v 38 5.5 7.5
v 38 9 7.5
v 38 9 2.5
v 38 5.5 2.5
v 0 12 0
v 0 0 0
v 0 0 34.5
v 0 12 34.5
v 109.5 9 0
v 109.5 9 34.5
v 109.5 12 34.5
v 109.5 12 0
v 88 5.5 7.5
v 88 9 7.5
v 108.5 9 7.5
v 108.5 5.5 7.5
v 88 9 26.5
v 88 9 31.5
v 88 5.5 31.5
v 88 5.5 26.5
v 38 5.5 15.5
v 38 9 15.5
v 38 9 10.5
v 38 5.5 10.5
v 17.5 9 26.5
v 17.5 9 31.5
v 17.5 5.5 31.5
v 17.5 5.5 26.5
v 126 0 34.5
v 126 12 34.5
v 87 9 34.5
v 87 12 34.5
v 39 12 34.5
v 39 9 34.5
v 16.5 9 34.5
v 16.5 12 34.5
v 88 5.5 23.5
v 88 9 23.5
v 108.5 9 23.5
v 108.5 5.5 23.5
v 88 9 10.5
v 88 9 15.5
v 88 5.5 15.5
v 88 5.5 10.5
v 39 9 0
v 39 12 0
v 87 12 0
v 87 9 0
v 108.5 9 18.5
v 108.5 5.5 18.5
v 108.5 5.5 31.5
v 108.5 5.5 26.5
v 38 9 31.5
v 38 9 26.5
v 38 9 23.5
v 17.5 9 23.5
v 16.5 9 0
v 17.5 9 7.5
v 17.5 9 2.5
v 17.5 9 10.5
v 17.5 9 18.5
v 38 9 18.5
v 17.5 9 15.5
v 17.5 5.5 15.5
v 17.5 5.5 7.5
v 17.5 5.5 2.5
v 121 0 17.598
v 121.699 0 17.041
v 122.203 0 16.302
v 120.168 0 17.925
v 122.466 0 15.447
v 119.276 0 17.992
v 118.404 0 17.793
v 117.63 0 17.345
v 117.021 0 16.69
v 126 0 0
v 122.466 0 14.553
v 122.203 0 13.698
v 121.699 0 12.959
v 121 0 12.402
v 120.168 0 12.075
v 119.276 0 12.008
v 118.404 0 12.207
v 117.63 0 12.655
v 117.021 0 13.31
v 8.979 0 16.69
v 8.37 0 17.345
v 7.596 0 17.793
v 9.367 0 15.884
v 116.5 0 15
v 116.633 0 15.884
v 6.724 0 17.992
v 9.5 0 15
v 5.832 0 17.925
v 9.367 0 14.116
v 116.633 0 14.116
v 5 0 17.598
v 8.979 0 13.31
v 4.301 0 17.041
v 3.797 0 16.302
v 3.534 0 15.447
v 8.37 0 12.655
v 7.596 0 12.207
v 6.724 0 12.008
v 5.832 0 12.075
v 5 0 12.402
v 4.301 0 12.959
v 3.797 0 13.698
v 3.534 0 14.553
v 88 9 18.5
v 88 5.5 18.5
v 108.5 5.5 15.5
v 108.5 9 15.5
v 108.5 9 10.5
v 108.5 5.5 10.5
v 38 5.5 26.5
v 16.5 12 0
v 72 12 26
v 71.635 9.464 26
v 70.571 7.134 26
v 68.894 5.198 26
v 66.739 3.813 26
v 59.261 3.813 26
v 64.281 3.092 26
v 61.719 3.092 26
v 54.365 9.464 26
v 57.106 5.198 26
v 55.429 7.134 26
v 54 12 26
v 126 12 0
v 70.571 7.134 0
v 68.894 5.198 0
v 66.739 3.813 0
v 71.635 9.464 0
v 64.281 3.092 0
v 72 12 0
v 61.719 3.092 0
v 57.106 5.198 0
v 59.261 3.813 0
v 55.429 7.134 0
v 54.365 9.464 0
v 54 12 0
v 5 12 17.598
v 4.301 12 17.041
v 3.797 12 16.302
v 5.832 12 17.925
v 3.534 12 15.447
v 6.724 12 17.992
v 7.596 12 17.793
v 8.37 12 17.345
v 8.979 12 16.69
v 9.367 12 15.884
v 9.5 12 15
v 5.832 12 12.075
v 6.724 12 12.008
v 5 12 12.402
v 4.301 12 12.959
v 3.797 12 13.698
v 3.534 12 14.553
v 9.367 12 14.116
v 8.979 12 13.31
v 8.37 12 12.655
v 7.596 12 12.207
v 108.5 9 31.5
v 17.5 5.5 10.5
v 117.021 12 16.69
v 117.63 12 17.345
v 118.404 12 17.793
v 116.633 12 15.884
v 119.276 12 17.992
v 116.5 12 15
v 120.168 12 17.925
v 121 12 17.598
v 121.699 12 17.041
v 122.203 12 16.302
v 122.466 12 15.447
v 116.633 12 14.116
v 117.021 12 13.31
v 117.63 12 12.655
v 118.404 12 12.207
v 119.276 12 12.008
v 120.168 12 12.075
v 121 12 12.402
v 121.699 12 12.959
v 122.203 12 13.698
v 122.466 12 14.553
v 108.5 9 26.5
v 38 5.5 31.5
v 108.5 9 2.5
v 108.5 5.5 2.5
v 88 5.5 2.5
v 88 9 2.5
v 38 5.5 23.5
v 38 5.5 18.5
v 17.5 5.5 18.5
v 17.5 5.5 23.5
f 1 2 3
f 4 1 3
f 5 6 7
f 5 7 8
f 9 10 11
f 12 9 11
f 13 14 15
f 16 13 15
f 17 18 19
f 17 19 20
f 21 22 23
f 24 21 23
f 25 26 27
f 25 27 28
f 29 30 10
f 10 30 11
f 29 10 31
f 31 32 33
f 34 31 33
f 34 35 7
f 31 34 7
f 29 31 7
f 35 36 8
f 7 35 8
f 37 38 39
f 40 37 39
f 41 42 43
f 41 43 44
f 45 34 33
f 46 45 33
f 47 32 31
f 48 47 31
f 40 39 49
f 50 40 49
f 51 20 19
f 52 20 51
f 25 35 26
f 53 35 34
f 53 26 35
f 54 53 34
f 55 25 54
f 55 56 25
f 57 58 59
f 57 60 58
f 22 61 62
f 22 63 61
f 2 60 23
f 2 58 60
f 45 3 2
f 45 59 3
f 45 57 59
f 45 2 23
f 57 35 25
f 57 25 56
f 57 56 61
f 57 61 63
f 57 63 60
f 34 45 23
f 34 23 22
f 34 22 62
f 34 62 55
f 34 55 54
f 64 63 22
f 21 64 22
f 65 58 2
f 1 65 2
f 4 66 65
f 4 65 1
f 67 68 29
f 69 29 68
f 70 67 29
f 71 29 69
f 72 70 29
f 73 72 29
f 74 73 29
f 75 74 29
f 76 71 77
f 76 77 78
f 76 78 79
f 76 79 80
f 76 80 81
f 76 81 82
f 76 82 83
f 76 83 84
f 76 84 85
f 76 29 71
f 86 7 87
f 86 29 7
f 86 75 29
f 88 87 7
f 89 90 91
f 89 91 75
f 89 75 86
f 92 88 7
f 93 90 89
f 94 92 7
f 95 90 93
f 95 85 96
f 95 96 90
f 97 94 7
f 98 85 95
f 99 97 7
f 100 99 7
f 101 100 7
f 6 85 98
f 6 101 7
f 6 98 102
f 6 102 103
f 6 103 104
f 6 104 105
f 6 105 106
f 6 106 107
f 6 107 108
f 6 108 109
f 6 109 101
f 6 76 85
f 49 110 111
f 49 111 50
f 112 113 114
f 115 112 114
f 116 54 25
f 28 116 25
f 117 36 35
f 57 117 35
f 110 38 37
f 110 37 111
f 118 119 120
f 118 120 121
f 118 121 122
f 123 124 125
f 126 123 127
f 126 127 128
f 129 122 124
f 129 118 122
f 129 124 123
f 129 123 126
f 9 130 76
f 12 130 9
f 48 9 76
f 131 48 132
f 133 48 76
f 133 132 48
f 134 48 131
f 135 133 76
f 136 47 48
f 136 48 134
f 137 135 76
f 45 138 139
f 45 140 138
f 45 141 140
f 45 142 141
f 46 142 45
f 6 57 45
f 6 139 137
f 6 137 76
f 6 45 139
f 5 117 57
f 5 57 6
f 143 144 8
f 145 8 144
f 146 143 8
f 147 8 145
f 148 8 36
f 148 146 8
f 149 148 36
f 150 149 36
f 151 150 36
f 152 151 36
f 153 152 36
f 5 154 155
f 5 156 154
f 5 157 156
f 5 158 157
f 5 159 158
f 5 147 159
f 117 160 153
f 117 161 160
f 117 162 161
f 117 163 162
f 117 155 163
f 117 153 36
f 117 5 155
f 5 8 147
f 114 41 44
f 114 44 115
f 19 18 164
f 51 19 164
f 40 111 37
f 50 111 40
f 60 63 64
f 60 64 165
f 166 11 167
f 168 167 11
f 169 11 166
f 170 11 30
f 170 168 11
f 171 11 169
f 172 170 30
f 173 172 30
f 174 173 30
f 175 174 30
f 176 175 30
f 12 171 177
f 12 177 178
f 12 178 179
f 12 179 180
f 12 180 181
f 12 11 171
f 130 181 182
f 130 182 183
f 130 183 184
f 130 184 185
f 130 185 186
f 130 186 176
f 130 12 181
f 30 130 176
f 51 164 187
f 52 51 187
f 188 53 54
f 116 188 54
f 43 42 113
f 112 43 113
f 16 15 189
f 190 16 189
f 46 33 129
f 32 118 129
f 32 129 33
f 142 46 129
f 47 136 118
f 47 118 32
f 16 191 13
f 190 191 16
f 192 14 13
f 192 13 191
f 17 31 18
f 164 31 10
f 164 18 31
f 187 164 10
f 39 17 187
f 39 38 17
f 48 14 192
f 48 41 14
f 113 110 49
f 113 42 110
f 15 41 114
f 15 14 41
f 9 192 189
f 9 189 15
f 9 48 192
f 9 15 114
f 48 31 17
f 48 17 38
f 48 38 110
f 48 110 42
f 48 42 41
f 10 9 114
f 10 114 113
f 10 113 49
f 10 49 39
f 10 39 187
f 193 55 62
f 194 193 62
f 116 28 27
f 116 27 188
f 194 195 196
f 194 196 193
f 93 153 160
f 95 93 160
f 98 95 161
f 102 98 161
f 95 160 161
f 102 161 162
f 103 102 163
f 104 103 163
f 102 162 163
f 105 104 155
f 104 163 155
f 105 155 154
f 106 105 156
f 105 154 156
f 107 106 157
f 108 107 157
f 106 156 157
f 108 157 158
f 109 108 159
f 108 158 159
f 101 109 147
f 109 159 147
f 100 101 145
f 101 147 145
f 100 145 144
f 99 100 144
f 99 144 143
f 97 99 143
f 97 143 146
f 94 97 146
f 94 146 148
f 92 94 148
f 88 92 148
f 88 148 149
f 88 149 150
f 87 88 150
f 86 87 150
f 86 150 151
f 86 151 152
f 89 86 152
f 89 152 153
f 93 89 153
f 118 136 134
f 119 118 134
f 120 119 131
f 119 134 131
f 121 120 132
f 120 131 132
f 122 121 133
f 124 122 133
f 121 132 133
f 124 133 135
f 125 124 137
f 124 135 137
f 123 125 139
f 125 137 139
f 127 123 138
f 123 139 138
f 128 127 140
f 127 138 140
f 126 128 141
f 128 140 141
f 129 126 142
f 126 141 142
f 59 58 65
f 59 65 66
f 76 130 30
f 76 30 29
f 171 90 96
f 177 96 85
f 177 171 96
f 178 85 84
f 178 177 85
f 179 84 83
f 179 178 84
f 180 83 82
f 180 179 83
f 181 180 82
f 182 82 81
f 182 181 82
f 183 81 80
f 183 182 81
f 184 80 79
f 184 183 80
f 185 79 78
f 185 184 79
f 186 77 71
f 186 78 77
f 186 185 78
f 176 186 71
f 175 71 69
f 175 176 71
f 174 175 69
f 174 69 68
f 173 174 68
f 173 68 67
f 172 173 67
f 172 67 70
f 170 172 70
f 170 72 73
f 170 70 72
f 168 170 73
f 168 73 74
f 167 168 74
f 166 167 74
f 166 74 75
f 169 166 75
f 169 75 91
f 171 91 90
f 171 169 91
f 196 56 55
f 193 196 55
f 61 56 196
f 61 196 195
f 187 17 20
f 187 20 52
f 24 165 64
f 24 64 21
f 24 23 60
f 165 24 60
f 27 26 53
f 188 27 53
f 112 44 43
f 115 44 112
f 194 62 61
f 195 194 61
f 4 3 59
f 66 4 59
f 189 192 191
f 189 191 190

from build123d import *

# Parameters (mm, degrees)
SALIENTE_EXTRUIR1_DEPTH = 34.5
CROQUIS2_R              = 9
CORTAR_EXTRUIR1_DEPTH   = 26
CROQUIS3_W              = 10
CROQUIS3_H              = 5
CROQUIS3_W_2            = 10.5
CROQUIS3_W_3            = 20.5
CORTAR_EXTRUIR2_DEPTH   = 3.5
CROQUIS4_R              = 3
CORTAR_EXTRUIR3_DEPTH   = 13


with BuildPart() as part:
    # Croquis1 → Saliente-Extruir1 (new body)
    with BuildSketch(Plane.XY):
        Polygon((0, 0), (0, 12), (16.5, 12), (16.5, 9), (39, 9), (39, 12), (87, 12), (87, 9), (109.5, 9), (109.5, 12), (126, 12), (126, 0), align=None)
    extrude(amount=SALIENTE_EXTRUIR1_DEPTH)

    # Croquis2 → Cortar-Extruir1 (cut)
    with BuildSketch(Plane(origin=(0, 0, 0), x_dir=(-1, 0, 0), z_dir=(0, 0, -1))):
        with Locations((-63, 12)):
            Circle(CROQUIS2_R)
    extrude(amount=-CORTAR_EXTRUIR1_DEPTH, mode=Mode.SUBTRACT)

    # Croquis3 → Cortar-Extruir2 (cut)
    with BuildSketch(Plane(origin=(0, 9, 0), x_dir=(1, 0, 0), z_dir=(0, 1, 0))):
        with Locations((22.5, -29)):
            Rectangle(CROQUIS3_W, CROQUIS3_H)
        with Locations((32.75, -29)):
            Rectangle(CROQUIS3_W_2, CROQUIS3_H)
        with Locations((32.75, -21)):
            Rectangle(CROQUIS3_W_2, CROQUIS3_H)
        with Locations((22.5, -21)):
            Rectangle(CROQUIS3_W, CROQUIS3_H)
        with Locations((32.75, -13)):
            Rectangle(CROQUIS3_W_2, CROQUIS3_H)
        with Locations((22.5, -13)):
            Rectangle(CROQUIS3_W, CROQUIS3_H)
        with Locations((32.75, -5)):
            Rectangle(CROQUIS3_W_2, CROQUIS3_H)
        with Locations((22.5, -5)):
            Rectangle(CROQUIS3_W, CROQUIS3_H)
        with Locations((98.25, -29)):
            Rectangle(CROQUIS3_W_3, CROQUIS3_H)
        with Locations((98.25, -21)):
            Rectangle(CROQUIS3_W_3, CROQUIS3_H)
        with Locations((98.25, -13)):
            Rectangle(CROQUIS3_W_3, CROQUIS3_H)
        with Locations((98.25, -5)):
            Rectangle(CROQUIS3_W_3, CROQUIS3_H)
    extrude(amount=-CORTAR_EXTRUIR2_DEPTH, mode=Mode.SUBTRACT)

    # Croquis4 → Cortar-Extruir3 (cut, through all)
    with BuildSketch(Plane(origin=(0, 12, 0), x_dir=(1, 0, 0), z_dir=(0, 1, 0))):
        with Locations((6.5, -15)):
            Circle(CROQUIS4_R)
    cortar_extruir3 = extrude(amount=-CORTAR_EXTRUIR3_DEPTH, mode=Mode.SUBTRACT)

    # Simetría1: Cortar-Extruir3 across plane
    add(cortar_extruir3.mirror(Plane.ZY.offset(-63)), mode=Mode.SUBTRACT)


solid = part.part
